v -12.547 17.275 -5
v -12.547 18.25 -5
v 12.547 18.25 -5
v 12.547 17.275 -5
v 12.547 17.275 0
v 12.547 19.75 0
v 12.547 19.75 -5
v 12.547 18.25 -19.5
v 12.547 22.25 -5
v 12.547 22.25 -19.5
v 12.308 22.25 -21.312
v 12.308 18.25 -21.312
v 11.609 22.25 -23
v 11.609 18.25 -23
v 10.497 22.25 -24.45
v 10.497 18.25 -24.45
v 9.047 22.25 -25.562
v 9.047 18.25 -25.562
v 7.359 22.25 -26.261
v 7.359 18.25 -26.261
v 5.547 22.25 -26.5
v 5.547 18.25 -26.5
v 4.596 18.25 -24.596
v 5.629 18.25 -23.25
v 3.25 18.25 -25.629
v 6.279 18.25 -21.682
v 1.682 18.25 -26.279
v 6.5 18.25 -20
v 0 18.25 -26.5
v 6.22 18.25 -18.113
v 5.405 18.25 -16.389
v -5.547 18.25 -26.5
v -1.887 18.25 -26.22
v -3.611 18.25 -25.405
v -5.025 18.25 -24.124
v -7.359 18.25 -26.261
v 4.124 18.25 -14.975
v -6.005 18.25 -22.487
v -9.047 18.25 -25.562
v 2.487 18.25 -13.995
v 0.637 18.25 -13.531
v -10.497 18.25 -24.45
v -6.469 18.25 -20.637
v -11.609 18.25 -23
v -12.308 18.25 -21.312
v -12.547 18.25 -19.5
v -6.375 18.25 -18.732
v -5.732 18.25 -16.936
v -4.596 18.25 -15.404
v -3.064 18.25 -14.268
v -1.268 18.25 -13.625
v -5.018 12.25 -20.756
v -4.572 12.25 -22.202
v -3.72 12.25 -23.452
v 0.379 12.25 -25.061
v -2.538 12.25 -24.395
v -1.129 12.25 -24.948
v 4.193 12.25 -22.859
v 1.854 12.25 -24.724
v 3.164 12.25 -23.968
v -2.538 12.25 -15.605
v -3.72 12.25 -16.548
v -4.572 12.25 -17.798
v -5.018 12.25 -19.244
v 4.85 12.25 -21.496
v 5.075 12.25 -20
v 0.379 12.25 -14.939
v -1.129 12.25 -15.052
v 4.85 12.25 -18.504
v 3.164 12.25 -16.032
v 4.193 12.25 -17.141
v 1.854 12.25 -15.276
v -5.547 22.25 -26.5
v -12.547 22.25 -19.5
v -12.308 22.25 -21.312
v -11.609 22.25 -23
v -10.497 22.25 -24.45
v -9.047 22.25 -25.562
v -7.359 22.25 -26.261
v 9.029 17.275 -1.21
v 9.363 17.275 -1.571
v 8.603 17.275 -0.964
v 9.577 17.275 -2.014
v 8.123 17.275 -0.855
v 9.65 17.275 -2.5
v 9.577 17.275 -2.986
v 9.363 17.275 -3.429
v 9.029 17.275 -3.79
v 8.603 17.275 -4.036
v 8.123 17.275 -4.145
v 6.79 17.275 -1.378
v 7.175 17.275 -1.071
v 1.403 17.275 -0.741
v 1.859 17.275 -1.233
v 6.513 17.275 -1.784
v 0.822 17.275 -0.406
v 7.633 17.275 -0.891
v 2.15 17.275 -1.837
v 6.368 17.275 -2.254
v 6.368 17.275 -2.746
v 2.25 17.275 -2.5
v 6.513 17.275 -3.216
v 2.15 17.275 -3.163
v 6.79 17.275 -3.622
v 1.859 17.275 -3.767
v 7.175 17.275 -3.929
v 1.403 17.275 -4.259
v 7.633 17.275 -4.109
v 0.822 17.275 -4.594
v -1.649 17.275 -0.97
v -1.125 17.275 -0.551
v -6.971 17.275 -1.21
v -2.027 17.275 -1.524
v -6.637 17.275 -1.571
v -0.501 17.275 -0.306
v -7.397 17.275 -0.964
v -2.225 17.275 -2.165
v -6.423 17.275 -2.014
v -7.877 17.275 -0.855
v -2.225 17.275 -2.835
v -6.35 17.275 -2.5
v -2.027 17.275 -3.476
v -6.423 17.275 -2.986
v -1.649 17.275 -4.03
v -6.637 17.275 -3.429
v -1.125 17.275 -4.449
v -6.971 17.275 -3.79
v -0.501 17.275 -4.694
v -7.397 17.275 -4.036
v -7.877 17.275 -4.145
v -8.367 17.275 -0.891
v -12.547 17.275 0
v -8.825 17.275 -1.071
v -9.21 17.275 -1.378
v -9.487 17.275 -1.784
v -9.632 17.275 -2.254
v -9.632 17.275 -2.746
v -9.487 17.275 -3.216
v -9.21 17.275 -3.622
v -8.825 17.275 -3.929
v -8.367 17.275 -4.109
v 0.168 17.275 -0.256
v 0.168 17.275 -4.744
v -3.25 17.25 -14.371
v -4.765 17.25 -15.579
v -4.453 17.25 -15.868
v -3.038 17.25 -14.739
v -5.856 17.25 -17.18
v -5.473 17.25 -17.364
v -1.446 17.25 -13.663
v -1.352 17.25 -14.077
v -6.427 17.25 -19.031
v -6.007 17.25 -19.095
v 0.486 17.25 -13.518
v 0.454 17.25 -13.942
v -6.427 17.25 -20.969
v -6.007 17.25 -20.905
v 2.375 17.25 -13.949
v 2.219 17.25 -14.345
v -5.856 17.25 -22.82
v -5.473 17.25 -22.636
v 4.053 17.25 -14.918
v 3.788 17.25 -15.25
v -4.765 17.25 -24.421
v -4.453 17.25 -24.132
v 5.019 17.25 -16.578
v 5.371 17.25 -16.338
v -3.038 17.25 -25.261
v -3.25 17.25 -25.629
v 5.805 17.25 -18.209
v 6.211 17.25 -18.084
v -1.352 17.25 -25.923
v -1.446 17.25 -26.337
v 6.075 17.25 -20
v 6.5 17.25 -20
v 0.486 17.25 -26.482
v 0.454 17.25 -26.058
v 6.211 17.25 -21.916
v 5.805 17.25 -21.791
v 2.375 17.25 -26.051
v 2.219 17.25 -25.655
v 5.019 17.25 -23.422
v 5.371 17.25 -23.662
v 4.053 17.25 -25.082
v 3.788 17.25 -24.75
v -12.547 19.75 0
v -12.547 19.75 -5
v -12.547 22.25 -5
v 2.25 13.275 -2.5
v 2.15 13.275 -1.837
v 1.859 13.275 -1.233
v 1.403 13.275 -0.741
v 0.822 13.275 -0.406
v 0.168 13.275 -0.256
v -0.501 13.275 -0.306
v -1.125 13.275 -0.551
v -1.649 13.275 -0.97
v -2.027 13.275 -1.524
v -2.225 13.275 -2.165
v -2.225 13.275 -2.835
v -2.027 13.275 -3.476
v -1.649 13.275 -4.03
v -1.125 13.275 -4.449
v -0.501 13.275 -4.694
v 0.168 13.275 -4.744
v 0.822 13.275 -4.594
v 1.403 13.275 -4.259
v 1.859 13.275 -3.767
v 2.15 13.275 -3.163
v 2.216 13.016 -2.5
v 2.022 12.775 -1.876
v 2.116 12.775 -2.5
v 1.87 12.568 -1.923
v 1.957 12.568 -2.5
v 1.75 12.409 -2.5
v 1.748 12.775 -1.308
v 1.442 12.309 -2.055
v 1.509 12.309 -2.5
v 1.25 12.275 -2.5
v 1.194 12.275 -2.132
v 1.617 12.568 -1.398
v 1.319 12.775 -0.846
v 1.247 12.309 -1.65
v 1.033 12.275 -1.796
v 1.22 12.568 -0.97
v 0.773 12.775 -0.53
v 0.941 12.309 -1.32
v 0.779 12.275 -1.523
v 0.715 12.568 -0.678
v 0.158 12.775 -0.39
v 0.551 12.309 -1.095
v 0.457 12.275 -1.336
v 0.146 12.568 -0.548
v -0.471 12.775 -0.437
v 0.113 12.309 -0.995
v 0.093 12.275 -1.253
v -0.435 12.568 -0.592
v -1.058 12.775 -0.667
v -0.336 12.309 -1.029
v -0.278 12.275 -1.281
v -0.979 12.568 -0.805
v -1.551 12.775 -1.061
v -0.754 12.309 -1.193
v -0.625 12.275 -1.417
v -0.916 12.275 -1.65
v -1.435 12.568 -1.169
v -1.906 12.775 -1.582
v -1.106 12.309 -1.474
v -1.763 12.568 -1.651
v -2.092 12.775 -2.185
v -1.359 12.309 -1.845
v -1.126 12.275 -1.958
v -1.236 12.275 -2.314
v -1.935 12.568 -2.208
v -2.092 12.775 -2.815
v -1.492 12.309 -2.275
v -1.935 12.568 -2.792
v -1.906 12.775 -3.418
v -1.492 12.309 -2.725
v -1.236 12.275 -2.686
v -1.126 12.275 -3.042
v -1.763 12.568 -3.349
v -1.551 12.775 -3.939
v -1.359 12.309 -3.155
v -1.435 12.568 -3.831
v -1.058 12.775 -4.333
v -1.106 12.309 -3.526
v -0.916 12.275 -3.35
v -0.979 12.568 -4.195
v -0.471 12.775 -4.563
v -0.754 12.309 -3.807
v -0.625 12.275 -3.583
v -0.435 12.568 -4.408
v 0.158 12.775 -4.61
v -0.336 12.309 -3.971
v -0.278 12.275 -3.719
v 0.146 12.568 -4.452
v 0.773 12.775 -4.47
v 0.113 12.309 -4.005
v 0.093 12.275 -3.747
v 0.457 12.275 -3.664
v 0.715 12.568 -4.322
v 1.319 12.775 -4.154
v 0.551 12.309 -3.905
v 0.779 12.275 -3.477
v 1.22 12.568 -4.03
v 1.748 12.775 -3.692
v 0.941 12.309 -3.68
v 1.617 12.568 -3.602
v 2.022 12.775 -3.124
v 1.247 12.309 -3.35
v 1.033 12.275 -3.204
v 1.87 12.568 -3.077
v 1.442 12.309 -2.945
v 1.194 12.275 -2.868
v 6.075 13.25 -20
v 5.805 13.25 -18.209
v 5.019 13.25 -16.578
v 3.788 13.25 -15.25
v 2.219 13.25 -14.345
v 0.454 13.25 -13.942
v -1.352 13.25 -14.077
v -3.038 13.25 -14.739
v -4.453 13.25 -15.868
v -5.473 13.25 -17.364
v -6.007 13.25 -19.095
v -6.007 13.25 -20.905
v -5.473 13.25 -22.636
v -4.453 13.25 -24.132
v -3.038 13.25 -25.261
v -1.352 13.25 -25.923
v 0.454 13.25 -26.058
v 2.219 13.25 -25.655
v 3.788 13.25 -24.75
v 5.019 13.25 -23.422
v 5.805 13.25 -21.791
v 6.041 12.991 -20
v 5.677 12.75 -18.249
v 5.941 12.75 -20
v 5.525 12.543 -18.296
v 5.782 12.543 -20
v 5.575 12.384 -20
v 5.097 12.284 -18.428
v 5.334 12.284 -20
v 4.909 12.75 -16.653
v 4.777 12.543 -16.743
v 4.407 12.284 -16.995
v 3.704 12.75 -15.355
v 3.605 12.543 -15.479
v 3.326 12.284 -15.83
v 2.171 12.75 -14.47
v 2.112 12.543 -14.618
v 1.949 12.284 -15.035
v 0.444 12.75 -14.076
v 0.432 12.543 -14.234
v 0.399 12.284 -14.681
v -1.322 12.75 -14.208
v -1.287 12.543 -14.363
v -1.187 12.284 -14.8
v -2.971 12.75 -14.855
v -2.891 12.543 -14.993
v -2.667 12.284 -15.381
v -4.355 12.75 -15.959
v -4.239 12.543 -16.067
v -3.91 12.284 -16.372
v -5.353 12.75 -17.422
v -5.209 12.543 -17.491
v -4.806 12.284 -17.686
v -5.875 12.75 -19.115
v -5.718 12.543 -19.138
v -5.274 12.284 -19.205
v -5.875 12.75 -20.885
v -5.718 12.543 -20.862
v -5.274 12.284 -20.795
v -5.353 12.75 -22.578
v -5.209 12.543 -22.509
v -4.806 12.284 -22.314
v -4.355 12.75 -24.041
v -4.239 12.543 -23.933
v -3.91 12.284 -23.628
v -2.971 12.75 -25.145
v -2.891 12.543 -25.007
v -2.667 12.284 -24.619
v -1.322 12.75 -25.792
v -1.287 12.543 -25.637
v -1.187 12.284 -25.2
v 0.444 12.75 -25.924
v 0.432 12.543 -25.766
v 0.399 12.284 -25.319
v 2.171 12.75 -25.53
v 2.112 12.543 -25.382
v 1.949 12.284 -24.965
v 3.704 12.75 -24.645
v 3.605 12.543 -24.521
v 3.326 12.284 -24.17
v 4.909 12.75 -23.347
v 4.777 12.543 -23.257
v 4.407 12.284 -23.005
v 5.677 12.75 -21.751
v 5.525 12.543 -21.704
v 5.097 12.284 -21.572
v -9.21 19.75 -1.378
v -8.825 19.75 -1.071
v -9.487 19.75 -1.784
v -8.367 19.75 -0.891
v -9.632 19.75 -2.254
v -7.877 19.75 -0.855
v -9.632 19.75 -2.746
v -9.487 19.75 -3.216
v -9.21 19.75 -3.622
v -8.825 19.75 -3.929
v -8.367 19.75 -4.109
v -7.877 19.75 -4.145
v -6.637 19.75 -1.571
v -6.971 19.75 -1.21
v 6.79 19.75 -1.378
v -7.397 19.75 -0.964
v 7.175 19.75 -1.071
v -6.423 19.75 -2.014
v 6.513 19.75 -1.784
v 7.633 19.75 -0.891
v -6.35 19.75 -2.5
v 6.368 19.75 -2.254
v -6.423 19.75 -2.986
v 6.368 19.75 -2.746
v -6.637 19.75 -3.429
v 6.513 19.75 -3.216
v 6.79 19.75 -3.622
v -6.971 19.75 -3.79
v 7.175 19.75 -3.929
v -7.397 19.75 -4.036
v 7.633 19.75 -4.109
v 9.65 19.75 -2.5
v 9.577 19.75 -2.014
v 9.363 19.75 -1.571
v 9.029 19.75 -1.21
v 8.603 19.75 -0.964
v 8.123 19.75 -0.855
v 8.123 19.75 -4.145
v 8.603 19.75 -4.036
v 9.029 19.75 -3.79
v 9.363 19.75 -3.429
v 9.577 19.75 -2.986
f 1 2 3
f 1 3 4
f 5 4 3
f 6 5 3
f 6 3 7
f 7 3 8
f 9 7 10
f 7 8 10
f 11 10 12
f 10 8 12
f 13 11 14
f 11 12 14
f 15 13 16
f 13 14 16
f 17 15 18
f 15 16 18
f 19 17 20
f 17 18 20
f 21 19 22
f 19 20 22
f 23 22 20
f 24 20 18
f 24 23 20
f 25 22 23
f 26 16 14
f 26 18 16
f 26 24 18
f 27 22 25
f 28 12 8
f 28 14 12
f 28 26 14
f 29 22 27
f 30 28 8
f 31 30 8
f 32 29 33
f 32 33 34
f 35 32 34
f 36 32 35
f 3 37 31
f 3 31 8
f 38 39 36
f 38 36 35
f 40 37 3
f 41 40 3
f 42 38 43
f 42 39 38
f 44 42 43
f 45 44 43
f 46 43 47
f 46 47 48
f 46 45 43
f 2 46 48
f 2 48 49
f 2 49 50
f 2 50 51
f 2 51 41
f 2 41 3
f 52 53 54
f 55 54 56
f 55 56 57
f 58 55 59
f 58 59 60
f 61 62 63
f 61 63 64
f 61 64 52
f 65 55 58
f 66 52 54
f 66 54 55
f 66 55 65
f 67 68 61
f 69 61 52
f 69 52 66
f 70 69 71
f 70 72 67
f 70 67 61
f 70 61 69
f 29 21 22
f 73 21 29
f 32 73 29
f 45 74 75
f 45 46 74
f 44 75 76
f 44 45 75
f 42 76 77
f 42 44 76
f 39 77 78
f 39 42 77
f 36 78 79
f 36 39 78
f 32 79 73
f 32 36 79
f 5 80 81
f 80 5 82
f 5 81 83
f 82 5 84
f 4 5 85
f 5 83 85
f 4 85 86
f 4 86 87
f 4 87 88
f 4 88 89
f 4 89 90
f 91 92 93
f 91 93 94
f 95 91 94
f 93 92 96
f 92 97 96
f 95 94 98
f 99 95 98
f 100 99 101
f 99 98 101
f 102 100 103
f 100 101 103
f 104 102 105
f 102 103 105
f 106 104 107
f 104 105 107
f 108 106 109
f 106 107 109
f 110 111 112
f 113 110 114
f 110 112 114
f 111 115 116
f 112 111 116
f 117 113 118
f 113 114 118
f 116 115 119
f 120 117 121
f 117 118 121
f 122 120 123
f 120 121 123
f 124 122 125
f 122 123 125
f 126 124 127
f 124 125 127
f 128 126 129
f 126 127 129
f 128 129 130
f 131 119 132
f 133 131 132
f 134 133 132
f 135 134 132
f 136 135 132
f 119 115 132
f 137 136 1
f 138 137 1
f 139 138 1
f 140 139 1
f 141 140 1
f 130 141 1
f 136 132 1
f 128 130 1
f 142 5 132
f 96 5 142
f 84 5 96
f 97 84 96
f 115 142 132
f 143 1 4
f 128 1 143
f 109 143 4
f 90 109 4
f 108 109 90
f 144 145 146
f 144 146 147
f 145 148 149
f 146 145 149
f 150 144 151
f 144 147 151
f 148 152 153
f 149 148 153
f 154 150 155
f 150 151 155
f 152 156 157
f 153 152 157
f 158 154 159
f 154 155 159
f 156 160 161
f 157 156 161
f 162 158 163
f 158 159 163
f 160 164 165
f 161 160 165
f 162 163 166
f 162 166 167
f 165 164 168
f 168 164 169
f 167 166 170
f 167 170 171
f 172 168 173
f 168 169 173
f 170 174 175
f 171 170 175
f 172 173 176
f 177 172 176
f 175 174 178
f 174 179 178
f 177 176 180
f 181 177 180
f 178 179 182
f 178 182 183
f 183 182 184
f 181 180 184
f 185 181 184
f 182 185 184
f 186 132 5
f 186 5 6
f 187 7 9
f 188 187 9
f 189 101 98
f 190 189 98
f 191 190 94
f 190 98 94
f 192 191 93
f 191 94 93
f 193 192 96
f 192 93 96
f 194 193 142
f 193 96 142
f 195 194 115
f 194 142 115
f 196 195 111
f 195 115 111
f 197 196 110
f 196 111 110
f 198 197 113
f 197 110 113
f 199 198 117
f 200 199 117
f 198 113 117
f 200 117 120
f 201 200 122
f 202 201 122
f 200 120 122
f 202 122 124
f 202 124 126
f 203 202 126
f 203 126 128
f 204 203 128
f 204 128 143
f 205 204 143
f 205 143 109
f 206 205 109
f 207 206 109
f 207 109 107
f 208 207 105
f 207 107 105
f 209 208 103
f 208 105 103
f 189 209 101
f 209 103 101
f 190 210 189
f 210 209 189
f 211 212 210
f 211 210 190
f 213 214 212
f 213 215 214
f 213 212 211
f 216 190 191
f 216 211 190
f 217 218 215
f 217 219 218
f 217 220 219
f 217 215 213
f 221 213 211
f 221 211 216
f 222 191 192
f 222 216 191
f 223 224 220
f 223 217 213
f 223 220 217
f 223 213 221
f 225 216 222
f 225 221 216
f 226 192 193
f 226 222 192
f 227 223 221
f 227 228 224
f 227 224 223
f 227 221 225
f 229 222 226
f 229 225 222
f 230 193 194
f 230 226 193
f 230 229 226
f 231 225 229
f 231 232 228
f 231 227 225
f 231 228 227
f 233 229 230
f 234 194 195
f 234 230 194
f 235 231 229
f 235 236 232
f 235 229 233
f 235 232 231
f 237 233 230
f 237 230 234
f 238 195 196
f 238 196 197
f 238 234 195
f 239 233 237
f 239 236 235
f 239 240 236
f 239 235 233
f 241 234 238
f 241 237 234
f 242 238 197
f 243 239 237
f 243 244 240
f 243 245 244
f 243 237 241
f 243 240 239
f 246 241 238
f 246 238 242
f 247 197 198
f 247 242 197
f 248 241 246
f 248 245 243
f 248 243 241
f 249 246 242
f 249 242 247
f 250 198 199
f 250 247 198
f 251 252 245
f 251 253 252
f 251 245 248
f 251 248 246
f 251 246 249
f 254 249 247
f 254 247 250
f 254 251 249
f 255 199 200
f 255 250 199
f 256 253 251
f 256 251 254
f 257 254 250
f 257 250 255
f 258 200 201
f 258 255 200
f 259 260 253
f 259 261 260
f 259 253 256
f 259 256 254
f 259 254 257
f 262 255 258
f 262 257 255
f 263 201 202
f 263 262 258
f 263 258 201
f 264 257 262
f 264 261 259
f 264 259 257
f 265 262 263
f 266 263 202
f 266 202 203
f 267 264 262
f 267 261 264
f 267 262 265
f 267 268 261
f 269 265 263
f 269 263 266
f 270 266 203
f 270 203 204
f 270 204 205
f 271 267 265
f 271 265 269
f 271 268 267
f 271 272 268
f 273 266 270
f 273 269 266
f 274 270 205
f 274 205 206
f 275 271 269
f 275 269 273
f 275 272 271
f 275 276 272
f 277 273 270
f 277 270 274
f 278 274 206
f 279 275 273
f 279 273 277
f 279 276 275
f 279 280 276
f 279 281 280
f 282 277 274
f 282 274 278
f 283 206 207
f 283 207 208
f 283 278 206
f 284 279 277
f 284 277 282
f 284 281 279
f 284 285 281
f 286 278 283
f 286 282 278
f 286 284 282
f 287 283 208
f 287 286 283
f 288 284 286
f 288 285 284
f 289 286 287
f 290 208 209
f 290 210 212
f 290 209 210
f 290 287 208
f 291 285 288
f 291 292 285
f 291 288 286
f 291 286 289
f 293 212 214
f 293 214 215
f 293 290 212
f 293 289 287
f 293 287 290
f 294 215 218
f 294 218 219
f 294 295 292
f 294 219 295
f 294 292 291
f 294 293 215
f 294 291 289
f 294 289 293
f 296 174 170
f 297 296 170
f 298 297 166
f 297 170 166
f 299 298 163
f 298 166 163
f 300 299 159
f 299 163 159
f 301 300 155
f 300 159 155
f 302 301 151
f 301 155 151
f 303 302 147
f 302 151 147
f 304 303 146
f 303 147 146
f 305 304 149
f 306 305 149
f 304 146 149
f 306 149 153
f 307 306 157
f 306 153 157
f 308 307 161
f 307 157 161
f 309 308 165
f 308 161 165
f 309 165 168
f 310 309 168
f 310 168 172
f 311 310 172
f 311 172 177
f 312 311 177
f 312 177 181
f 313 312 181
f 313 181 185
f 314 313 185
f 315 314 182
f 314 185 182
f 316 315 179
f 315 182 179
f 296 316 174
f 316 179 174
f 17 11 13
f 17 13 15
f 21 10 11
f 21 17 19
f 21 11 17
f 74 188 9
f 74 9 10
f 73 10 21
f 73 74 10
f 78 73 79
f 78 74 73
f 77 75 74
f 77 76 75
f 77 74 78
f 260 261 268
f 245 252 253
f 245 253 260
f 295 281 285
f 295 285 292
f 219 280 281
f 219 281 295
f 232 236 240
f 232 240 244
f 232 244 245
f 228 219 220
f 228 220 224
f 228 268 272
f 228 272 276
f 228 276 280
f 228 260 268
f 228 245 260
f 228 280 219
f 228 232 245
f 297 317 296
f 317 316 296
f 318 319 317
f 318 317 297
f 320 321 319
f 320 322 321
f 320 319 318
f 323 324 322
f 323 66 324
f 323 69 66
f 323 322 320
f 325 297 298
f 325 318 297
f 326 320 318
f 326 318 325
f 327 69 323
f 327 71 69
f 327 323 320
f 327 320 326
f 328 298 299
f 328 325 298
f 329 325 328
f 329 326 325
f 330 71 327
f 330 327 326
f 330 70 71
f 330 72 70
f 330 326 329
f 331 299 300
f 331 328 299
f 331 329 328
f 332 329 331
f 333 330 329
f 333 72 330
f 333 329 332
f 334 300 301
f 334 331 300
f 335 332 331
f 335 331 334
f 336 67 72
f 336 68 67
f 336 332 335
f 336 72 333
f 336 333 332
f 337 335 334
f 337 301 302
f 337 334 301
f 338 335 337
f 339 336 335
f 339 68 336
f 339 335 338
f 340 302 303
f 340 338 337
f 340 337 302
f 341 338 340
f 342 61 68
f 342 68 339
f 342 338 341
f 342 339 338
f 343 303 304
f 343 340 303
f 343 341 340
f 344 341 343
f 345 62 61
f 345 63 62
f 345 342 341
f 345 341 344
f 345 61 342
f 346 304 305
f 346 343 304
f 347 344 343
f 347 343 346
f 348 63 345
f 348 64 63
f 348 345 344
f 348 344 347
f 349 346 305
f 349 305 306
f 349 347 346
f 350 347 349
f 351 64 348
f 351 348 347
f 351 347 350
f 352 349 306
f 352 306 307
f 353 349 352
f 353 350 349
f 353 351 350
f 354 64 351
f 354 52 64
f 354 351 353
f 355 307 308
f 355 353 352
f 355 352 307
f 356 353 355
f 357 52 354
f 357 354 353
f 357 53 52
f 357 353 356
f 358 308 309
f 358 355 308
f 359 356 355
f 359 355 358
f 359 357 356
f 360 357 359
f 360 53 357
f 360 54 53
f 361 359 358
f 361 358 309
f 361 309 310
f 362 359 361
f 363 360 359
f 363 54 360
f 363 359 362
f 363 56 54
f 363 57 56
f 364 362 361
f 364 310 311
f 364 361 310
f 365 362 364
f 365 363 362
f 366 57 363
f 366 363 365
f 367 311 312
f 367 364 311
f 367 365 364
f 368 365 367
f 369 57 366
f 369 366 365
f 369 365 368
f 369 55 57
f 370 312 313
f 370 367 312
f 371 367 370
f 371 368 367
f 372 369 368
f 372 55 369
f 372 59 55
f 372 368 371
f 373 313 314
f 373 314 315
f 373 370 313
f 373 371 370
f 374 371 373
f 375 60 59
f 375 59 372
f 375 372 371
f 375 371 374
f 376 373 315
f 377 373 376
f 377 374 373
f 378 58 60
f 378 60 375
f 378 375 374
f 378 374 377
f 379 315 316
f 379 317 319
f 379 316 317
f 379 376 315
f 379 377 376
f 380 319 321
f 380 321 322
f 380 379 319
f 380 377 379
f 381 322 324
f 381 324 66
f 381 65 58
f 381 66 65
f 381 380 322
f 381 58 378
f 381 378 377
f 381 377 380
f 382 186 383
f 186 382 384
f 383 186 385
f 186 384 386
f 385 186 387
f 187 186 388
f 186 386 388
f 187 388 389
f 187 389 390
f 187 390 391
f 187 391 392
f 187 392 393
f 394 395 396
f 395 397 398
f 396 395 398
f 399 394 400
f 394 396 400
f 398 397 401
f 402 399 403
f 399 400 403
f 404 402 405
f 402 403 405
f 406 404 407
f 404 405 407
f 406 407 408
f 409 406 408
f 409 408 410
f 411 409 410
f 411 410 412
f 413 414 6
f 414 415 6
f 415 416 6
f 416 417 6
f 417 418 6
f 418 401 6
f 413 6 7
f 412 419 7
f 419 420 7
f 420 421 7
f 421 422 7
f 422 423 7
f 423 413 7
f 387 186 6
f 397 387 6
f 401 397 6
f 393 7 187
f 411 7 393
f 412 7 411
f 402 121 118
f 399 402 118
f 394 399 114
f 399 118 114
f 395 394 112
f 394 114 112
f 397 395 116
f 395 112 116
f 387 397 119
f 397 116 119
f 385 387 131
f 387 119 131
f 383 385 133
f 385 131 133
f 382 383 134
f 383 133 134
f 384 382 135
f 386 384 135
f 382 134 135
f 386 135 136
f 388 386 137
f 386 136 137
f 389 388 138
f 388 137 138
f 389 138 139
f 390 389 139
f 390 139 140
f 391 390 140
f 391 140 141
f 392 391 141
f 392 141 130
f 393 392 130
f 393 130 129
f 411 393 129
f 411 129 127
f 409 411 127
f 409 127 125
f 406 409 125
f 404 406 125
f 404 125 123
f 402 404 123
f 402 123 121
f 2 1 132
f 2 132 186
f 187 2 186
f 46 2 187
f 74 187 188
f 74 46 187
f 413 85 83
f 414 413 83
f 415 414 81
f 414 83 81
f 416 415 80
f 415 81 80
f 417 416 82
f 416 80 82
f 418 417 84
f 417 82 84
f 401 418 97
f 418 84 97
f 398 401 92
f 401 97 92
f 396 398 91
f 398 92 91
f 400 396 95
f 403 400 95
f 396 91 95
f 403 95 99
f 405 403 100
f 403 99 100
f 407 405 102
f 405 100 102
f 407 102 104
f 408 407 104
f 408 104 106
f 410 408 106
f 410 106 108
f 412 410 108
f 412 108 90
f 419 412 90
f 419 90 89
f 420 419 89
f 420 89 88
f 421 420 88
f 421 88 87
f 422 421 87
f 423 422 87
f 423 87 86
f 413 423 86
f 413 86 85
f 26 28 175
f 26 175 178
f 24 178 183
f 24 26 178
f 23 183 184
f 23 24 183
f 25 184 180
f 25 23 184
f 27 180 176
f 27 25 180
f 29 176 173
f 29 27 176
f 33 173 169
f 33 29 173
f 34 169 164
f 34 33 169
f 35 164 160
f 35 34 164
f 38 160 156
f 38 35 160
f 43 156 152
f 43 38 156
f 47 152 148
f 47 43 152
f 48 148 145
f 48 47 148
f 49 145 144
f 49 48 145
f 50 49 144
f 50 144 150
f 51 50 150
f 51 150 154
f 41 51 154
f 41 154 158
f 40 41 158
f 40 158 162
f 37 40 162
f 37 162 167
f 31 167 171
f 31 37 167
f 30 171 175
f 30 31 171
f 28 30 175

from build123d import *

# Parameters (mm, degrees)
SKETCH4_W                = 12.46
SKETCH4_H                = 17.25
BOSS_EXTRUDE3_DEPTH      = 6
SKETCH8_R                = 12.546781182
SKETCH8_R_2              = 11.15
BOSS_EXTRUDE6_DEPTH      = 8.3
BOSS_EXTRUDE6_DEPTH_BACK = 17.25
BOSS_EXTRUDE4_DEPTH      = 17.25
SKETCH6_R                = 0.75
CUT_EXTRUDE1_DEPTH       = 5
CHAMFER1_SIZE            = 0.5
CHAMFER1_SIZE2           = 0.866025404
SKETCH10_W               = 12.46
SKETCH10_H               = 23.7
CUT_EXTRUDE3_DEPTH       = 17.25
BOSS_EXTRUDE7_DEPTH      = 8.3
BOSS_EXTRUDE9_DEPTH      = 10
SKETCH20_R               = 11.15
SKETCH20_R_2             = 7.15
BOSS_EXTRUDE11_DEPTH     = 8.3
SKETCH21_R               = 10.15
SKETCH21_R_2             = 7.15
CUT_EXTRUDE7_DEPTH       = 1.3
SKETCH11_W               = 10
SKETCH11_H               = 2
CUT_EXTRUDE4_DEPTH       = 23.7
CUT_EXTRUDE8_REACH       = 37.55
SKETCH24_W               = 12.46
SKETCH24_H               = 6
BOSS_EXTRUDE10_DEPTH     = 25.093562
SKETCH18_W               = 21.5
SKETCH18_H               = 12.438292938
CUT_EXTRUDE5_DEPTH       = 2
SKETCH19_R               = 3.5
CUT_EXTRUDE6_DEPTH       = 43.5
CUT_EXTRUDE6_DEPTH_BACK  = 3
FILLET1_R                = 7
SKETCH22_R               = 6.5
BOSS_EXTRUDE12_DEPTH     = 5
SKETCH23_R               = 6.075
BOSS_EXTRUDE13_DEPTH     = 5
FILLET2_R                = 1
BOSS_EXTRUDE15_DEPTH     = 2
CUT_EXTRUDE9_REACH       = 46.5
SKETCH26_R               = 0.75
CUT_EXTRUDE10_DEPTH      = 26.093562364
SKETCH28_R               = 1.65
CUT_EXTRUDE11_DEPTH      = 5.975
SKETCH29_R               = 2.25
BOSS_EXTRUDE16_DEPTH     = 5
FILLET3_R                = 1
SKETCH30_W               = 5
SKETCH30_H               = 2.5
CUT_EXTRUDE12_DEPTH      = 26.093562364


with BuildPart() as part:
    # Sketch4 → Boss-Extrude3 (new body)
    with BuildSketch(Plane.XY):
        with Locations((0, -1.35)):
            Rectangle(SKETCH4_W, SKETCH4_H)
    extrude(amount=BOSS_EXTRUDE3_DEPTH)



with BuildPart() as body_2:
    # Sketch8 → Boss-Extrude6 (new body, two sides)
    with BuildSketch(Plane(origin=(0, -9.975, 0), x_dir=(-1, 0, 0), z_dir=(0, -1, 0))) as boss_extrude6_sk:
        with Locations((0, -23.55)):
            Circle(SKETCH8_R)
        with Locations((0, -23.55)):
            Circle(SKETCH8_R_2, mode=Mode.SUBTRACT)
    extrude(amount=BOSS_EXTRUDE6_DEPTH)
    extrude(boss_extrude6_sk.sketch, amount=-BOSS_EXTRUDE6_DEPTH_BACK)


with BuildPart() as part_1:
    add(part.part)

    add(body_2.part)  # Boss-Extrude4 merges body 2
    # Sketch5 → Boss-Extrude4 (add)
    with BuildSketch(Plane(origin=(0, 7.275, 0), x_dir=(1, 0, 0), z_dir=(0, 1, 0))):
        with BuildLine():
            Line((12.546781182, -23.55), (12.546781182, 0))
            Line((12.546781182, 0), (6.23, 0))
            Line((6.23, 0), (6.23, -29.7))
            Line((6.23, -29.7), (-6.23, -29.7))
            Line((-6.23, -29.7), (-6.23, 0))
            Line((-6.23, 0), (-12.546781182, 0))
            Line((-12.546781182, 0), (-12.546781182, -23.55))
            ThreePointArc((-12.546781182, -23.55), (0, -36.096781182), (12.546781182, -23.55))
        make_face()
    extrude(amount=-BOSS_EXTRUDE4_DEPTH)

    # Sketch6 → Cut-Extrude1 (cut)
    with BuildSketch(Plane(origin=(0, 7.275, 0), x_dir=(1, 0, 0), z_dir=(0, 1, 0))):
        with Locations((0, -3.6)):
            Circle(SKETCH6_R)
        with Locations((0, -32.1)):
            Circle(SKETCH6_R)
    extrude(amount=-CUT_EXTRUDE1_DEPTH, mode=Mode.SUBTRACT)

    # Chamfer1
    chamfer1_edges = [part_1.edges().sort_by_distance(p)[0] for p in [
        (-0.75, 7.275, 3.6),
        (-0.75, 7.275, 32.1),
    ]]
    chamfer1_side = [part_1.faces().sort_by_distance(p)[0] for p in [
        (0, 7.275, 35.657160381),
    ]]
    chamfer(chamfer1_edges, length=CHAMFER1_SIZE, length2=CHAMFER1_SIZE2, reference=chamfer1_side[0])

    # Sketch10 → Cut-Extrude3 (cut)
    with BuildSketch(Plane(origin=(0, 7.275, 0), x_dir=(1, 0, 0), z_dir=(0, 1, 0))):
        with Locations((0, -17.85)):
            Rectangle(SKETCH10_W, SKETCH10_H)
    extrude(amount=-CUT_EXTRUDE3_DEPTH, mode=Mode.SUBTRACT)

    # Sketch13 → Boss-Extrude7 (add)
    with BuildSketch(Plane.XZ.offset(18.275)):
        with BuildLine():
            Line((-12.546781182, 23.55), (-12.546781182, 0))
            Line((-12.546781182, 0), (12.546781182, 0))
            Line((12.546781182, 0), (12.546781182, 23.55))
            ThreePointArc((12.546781182, 23.55), (0, 11.003218818), (-12.546781182, 23.55))
        make_face()
    extrude(amount=-BOSS_EXTRUDE7_DEPTH)

    # Sketch15 → Boss-Extrude9 (add)
    with BuildSketch(Plane(origin=(0, 7.275, 0), x_dir=(1, 0, 0), z_dir=(0, 1, 0))):
        with BuildLine():
            Line((-12.546781182, 0), (12.546781182, 0))
            Line((12.546781182, 0), (12.546781182, -23.55))
            ThreePointArc((12.546781182, -23.55), (0, -36.096781182), (-12.546781182, -23.55))
            Line((-12.546781182, -23.55), (-12.546781182, 0))
        make_face()
        with BuildLine():
            Line((-6.23, -0.8), (6.23, -0.8))
            Line((6.23, -0.8), (6.23, -33))
            ThreePointArc((6.23, -33), (5.790660172, -34.060660172), (4.73, -34.5))
            Line((4.73, -34.5), (-4.73, -34.5))
            ThreePointArc((-4.73, -34.5), (-5.790660172, -34.060660172), (-6.23, -33))
            Line((-6.23, -33), (-6.23, -0.8))
        make_face(mode=Mode.SUBTRACT)
    extrude(amount=BOSS_EXTRUDE9_DEPTH)

    # Sketch20 → Boss-Extrude11 (add)
    with BuildSketch(Plane.XZ.offset(18.275)):
        with Locations((0, 23.55)):
            Circle(SKETCH20_R)
        with Locations((0, 23.55)):
            Circle(SKETCH20_R_2, mode=Mode.SUBTRACT)
    extrude(amount=-BOSS_EXTRUDE11_DEPTH)

    # Sketch21 → Cut-Extrude7 (cut)
    with BuildSketch(Plane.XZ.offset(18.275)):
        with Locations((0, 23.55)):
            Circle(SKETCH21_R)
        with Locations((0, 23.55)):
            Circle(SKETCH21_R_2, mode=Mode.SUBTRACT)
    extrude(amount=-CUT_EXTRUDE7_DEPTH, mode=Mode.SUBTRACT)

    # Sketch11 → Cut-Extrude4 (cut)
    with BuildSketch(Plane.XY.offset(29.7)):
        with Locations((0, -10.975)):
            Rectangle(SKETCH11_W, SKETCH11_H)
    extrude(amount=-CUT_EXTRUDE4_DEPTH, mode=Mode.SUBTRACT)

    # Sketch24 → Cut-Extrude8 (cut, up to next)
    with BuildSketch(Plane.XZ.offset(18.275), mode=Mode.PRIVATE) as cut_extrude8_sk1:
        with Locations((0, 9)):
            Rectangle(SKETCH24_W, SKETCH24_H)
    cut_extrude8_tool1 = extrude(cut_extrude8_sk1.sketch, amount=-CUT_EXTRUDE8_REACH, mode=Mode.PRIVATE) & part_1.part
    add(cut_extrude8_tool1.solids().sort_by_distance((0, -18.275, 9))[0], mode=Mode.SUBTRACT)

    # Sketch17 → Boss-Extrude10 (add)
    with BuildSketch(Plane(origin=(-12.546781182, 4.728218818, 0), x_dir=(0, -1, 0), z_dir=(1, 0, 0))):
        Polygon((26.978218818, 26.5), (26.978218818, 0), (-17.521781182, 0), (-17.521781182, 26.5), (-13.521781182, 26.5), (-13.521781182, 5), (22.978218818, 5), (22.978218818, 26.5), align=None)
    extrude(amount=BOSS_EXTRUDE10_DEPTH)

    # Sketch18 → Cut-Extrude5 (cut)
    with BuildSketch(Plane.ZX.offset(-18.25)):
        with Locations((-15.75, 0)):
            Rectangle(SKETCH18_W, SKETCH18_H)
    extrude(amount=-CUT_EXTRUDE5_DEPTH, mode=Mode.SUBTRACT)

    # Sketch19 → Cut-Extrude6 (cut, two sides)
    with BuildSketch(Plane.ZX.offset(-20.25)) as cut_extrude6_sk:
        with Locations((-20, 0)):
            Circle(SKETCH19_R)
    extrude(amount=CUT_EXTRUDE6_DEPTH, mode=Mode.SUBTRACT)
    extrude(cut_extrude6_sk.sketch, amount=-CUT_EXTRUDE6_DEPTH_BACK, mode=Mode.SUBTRACT)

    # Fillet1
    fillet1_edges = [part_1.edges().sort_by_distance(p)[0] for p in [
        (12.546780818, -20.25, -26.5),
        (-12.546781182, -20.25, -26.5),
        (-12.546781182, 20.25, -26.5),
        (12.546780818, 20.25, -26.5),
    ]]
    fillet(fillet1_edges, radius=FILLET1_R)

    # Sketch22 → Boss-Extrude12 (add)
    with BuildSketch(Plane(origin=(0, 22.25, 0), x_dir=(1, 0, 0), z_dir=(0, 1, 0))):
        with Locations((0, 20)):
            Circle(SKETCH22_R)
    extrude(amount=-BOSS_EXTRUDE12_DEPTH)

    # Sketch23 → Boss-Extrude13 (add)
    with BuildSketch(Plane.XZ.offset(-17.25)):
        with Locations((0, -20)):
            Circle(SKETCH23_R)
    extrude(amount=BOSS_EXTRUDE13_DEPTH)

    # Fillet2
    fillet2_edges = [part_1.edges().sort_by_distance(p)[0] for p in [
        (-6.075, 12.25, -20),
    ]]
    fillet(fillet2_edges, radius=FILLET2_R)

    # Sketch25 → Boss-Extrude15 (add)
    with BuildSketch(Plane(origin=(0, -20.25, 0), x_dir=(1, 0, 0), z_dir=(0, 1, 0))):
        Polygon((-6.219146469, 5), (-2.5, 5), (-3.1585, 20), (-3.44385, 26.5), (-6.219146469, 26.5), align=None)
        Polygon((6.219146469, 5), (2.5, 5), (3.1585, 20), (3.44385, 26.5), (6.219146469, 26.5), align=None)
    extrude(amount=BOSS_EXTRUDE15_DEPTH)

    # Sketch26 → Cut-Extrude9 (cut, up to next)
    with BuildSketch(Plane(origin=(0, -22.25, 0), x_dir=(-1, 0, 0), z_dir=(0, -1, 0)), mode=Mode.PRIVATE) as cut_extrude9_sk1:
        with Locations((0, 10)):
            Circle(SKETCH26_R)
    cut_extrude9_tool1 = extrude(cut_extrude9_sk1.sketch, amount=-CUT_EXTRUDE9_REACH, mode=Mode.PRIVATE) & part_1.part
    add(cut_extrude9_tool1.solids().sort_by_distance((0, -22.25, -10))[0], mode=Mode.SUBTRACT)

    # Sketch27 → Cut-Extrude10 (cut, through all)
    with BuildSketch(Plane.ZY.offset(12.546781182)):
        Polygon((36.096781182, 17.275), (-10.020668602, 17.275), (-10.020668602, 5.331631915), (-33.329469664, 5.331631915), (-33.329469664, -27.204993615), (36.096781182, -27.204993615), align=None)
    extrude(amount=-CUT_EXTRUDE10_DEPTH, mode=Mode.SUBTRACT)

    # Sketch28 → Cut-Extrude11 (cut, through all)
    with BuildSketch(Plane.XZ.offset(-17.275)):
        with Locations((-8, -2.5)):
            Circle(SKETCH28_R)
        with Locations((8, -2.5)):
            Circle(SKETCH28_R)
    extrude(amount=-CUT_EXTRUDE11_DEPTH, mode=Mode.SUBTRACT)

    # Sketch29 → Boss-Extrude16 (add)
    with BuildSketch(Plane.XZ.offset(-17.275)):
        with Locations((0, -2.5)):
            Circle(SKETCH29_R)
    extrude(amount=BOSS_EXTRUDE16_DEPTH)

    # Fillet3
    fillet3_edges = [part_1.edges().sort_by_distance(p)[0] for p in [
        (-2.25, 12.275, -2.5),
    ]]
    fillet(fillet3_edges, radius=FILLET3_R)

    # Sketch30 → Cut-Extrude12 (cut, through all)
    with BuildSketch(Plane(origin=(12.546781182, 0, 0), x_dir=(0, 0, -1), z_dir=(1, 0, 0))):
        with Locations((2.5, 21)):
            Rectangle(SKETCH30_W, SKETCH30_H)
    extrude(amount=-CUT_EXTRUDE12_DEPTH, mode=Mode.SUBTRACT)


solid = part_1.part
